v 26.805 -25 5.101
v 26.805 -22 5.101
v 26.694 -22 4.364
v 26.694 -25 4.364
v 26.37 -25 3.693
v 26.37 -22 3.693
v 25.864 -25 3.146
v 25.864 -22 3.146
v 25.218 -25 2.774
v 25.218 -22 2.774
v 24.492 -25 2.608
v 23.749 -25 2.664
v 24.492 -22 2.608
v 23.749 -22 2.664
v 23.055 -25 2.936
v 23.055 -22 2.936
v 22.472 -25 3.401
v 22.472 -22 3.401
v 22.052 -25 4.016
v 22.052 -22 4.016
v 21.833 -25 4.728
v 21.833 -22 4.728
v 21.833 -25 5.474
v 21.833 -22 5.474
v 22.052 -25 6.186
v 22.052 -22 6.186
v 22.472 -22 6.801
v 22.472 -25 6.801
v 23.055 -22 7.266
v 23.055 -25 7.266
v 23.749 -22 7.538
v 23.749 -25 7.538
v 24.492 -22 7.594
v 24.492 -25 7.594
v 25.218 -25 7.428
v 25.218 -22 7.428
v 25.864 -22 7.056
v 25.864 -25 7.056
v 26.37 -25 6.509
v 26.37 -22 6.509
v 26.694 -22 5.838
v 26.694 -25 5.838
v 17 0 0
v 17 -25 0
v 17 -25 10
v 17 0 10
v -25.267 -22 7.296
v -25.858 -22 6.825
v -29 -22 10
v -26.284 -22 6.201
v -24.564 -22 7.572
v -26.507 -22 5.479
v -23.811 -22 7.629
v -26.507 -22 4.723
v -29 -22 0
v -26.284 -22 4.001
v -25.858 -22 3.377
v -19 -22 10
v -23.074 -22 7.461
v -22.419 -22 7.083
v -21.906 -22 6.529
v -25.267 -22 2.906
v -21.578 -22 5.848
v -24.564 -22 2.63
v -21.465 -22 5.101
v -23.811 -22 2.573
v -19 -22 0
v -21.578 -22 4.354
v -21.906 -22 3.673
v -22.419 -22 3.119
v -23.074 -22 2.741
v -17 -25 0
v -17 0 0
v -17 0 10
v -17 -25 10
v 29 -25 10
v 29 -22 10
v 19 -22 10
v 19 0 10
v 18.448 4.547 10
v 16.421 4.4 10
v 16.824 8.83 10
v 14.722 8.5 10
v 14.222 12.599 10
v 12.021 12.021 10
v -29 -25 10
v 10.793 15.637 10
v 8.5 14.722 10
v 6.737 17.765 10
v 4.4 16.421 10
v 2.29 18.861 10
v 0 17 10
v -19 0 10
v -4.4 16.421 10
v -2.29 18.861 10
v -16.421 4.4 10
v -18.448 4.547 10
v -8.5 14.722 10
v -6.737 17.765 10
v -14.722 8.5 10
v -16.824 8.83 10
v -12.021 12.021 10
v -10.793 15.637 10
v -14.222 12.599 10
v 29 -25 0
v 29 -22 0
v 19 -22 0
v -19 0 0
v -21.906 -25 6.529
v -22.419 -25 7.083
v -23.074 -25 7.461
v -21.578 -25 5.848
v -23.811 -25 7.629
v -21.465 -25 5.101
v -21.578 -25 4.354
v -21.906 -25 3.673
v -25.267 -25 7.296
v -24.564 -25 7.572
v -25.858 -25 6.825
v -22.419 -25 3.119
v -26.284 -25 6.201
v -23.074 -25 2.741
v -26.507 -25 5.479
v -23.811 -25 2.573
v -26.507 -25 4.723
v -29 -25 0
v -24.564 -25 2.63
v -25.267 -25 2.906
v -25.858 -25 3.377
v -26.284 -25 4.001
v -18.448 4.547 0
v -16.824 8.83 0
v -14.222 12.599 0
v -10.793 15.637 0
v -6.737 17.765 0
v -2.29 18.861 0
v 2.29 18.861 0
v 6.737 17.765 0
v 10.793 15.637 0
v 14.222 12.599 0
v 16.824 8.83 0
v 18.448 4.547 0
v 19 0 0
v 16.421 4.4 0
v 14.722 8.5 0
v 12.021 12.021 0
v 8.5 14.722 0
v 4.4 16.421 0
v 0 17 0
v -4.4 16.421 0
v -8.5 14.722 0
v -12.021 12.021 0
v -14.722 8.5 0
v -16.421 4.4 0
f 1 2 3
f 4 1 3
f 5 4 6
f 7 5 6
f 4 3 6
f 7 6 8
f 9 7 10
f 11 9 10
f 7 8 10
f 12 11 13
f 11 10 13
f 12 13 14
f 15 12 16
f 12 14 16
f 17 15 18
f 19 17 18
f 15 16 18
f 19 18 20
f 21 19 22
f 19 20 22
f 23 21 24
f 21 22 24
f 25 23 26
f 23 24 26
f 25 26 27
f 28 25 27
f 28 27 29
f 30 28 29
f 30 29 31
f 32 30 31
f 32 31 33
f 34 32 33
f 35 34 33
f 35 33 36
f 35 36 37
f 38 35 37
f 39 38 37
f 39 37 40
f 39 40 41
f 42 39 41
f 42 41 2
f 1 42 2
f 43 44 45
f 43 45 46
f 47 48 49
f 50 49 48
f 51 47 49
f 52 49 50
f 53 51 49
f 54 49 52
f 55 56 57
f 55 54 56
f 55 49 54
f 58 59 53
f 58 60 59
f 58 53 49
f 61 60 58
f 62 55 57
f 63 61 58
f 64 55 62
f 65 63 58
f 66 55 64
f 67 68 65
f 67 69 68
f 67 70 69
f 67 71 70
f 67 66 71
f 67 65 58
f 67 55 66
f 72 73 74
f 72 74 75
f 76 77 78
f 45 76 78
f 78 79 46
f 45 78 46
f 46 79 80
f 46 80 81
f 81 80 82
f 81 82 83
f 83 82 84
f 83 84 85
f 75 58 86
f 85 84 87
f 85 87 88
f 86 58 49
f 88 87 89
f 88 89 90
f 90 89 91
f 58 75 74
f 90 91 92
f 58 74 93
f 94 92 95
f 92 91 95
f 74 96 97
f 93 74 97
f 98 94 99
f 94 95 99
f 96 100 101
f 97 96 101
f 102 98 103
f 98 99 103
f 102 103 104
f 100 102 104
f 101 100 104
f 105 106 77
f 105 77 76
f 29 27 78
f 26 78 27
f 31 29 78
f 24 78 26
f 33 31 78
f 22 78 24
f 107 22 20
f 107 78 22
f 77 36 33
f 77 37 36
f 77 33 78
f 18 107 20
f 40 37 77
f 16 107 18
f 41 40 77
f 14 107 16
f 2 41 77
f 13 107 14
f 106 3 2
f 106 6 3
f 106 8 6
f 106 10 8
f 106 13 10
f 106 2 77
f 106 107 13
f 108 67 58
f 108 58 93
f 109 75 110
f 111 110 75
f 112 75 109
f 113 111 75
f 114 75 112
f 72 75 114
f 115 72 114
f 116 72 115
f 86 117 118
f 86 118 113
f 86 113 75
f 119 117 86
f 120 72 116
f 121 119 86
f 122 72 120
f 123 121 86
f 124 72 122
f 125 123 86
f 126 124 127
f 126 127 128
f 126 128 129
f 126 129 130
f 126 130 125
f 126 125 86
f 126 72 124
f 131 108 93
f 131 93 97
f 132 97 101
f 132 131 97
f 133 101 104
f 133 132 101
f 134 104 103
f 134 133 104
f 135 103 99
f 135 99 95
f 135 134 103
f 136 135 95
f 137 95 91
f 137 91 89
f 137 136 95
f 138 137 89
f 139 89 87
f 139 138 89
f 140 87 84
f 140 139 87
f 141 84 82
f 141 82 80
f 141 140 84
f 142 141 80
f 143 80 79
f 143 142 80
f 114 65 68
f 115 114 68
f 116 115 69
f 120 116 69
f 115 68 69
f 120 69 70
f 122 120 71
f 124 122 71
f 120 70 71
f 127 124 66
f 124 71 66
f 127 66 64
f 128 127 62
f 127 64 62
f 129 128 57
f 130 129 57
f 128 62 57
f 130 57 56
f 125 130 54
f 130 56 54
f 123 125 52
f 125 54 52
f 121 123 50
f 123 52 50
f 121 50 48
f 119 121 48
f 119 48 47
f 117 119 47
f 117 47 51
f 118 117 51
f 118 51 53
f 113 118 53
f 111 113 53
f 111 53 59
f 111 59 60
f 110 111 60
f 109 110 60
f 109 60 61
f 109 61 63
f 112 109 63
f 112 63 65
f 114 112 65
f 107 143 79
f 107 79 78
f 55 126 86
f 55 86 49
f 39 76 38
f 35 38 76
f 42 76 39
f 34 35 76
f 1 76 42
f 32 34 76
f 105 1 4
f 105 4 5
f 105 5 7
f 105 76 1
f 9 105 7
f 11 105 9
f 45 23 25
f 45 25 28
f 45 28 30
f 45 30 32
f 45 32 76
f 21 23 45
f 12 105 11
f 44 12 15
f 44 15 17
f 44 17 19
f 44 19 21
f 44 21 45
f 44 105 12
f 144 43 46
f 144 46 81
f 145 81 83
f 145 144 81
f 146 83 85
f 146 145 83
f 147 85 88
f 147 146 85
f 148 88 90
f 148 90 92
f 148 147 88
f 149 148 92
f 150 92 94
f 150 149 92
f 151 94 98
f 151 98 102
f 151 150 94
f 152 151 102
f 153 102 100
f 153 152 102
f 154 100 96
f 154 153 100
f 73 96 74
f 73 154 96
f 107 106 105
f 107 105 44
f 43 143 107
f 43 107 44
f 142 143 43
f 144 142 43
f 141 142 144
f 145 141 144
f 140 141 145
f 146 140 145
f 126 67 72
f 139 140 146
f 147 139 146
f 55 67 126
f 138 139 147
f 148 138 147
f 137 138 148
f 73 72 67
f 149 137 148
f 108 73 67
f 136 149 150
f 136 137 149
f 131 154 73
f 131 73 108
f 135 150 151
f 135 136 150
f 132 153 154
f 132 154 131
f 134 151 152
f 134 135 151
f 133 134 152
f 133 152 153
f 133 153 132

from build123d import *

# Parameters (mm, degrees)
BOSS_EXTRUDE1_DEPTH = 10
SKETCH2_R           = 2.534927605
SKETCH2_R_2         = 2.5
CUT_EXTRUDE1_DEPTH  = 10


with BuildPart() as part:
    # Sketch1 → Boss-Extrude1 (new body)
    with BuildSketch(Plane.XY):
        with BuildLine():
            Line((-17, 0), (-17, -24))
            Line((-17, -24), (-17, -25))
            Line((-17, -25), (-29, -25))
            Line((-29, -25), (-29, -22))
            Line((-29, -22), (-19, -22))
            Line((-19, -22), (-19, 0))
            ThreePointArc((-19, 0), (0, 19), (19, 0))
            Line((19, 0), (19, -22))
            Line((19, -22), (29, -22))
            Line((29, -22), (29, -25))
            Line((29, -25), (17, -25))
            Line((17, -25), (17, -24))
            Line((17, -24), (17, 0))
            ThreePointArc((17, 0), (0, 17), (-17, 0))
        make_face()
    extrude(amount=BOSS_EXTRUDE1_DEPTH)

    # Sketch2 → Cut-Extrude1 (cut)
    with BuildSketch(Plane(origin=(0, -22, 0), x_dir=(1, 0, 0), z_dir=(0, 1, 0))):
        with Locations((-24, -5.101003531)):
            Circle(SKETCH2_R)
        with Locations((24.304859837, -5.101003531)):
            Circle(SKETCH2_R_2)
    extrude(amount=-CUT_EXTRUDE1_DEPTH, mode=Mode.SUBTRACT)


solid = part.part
